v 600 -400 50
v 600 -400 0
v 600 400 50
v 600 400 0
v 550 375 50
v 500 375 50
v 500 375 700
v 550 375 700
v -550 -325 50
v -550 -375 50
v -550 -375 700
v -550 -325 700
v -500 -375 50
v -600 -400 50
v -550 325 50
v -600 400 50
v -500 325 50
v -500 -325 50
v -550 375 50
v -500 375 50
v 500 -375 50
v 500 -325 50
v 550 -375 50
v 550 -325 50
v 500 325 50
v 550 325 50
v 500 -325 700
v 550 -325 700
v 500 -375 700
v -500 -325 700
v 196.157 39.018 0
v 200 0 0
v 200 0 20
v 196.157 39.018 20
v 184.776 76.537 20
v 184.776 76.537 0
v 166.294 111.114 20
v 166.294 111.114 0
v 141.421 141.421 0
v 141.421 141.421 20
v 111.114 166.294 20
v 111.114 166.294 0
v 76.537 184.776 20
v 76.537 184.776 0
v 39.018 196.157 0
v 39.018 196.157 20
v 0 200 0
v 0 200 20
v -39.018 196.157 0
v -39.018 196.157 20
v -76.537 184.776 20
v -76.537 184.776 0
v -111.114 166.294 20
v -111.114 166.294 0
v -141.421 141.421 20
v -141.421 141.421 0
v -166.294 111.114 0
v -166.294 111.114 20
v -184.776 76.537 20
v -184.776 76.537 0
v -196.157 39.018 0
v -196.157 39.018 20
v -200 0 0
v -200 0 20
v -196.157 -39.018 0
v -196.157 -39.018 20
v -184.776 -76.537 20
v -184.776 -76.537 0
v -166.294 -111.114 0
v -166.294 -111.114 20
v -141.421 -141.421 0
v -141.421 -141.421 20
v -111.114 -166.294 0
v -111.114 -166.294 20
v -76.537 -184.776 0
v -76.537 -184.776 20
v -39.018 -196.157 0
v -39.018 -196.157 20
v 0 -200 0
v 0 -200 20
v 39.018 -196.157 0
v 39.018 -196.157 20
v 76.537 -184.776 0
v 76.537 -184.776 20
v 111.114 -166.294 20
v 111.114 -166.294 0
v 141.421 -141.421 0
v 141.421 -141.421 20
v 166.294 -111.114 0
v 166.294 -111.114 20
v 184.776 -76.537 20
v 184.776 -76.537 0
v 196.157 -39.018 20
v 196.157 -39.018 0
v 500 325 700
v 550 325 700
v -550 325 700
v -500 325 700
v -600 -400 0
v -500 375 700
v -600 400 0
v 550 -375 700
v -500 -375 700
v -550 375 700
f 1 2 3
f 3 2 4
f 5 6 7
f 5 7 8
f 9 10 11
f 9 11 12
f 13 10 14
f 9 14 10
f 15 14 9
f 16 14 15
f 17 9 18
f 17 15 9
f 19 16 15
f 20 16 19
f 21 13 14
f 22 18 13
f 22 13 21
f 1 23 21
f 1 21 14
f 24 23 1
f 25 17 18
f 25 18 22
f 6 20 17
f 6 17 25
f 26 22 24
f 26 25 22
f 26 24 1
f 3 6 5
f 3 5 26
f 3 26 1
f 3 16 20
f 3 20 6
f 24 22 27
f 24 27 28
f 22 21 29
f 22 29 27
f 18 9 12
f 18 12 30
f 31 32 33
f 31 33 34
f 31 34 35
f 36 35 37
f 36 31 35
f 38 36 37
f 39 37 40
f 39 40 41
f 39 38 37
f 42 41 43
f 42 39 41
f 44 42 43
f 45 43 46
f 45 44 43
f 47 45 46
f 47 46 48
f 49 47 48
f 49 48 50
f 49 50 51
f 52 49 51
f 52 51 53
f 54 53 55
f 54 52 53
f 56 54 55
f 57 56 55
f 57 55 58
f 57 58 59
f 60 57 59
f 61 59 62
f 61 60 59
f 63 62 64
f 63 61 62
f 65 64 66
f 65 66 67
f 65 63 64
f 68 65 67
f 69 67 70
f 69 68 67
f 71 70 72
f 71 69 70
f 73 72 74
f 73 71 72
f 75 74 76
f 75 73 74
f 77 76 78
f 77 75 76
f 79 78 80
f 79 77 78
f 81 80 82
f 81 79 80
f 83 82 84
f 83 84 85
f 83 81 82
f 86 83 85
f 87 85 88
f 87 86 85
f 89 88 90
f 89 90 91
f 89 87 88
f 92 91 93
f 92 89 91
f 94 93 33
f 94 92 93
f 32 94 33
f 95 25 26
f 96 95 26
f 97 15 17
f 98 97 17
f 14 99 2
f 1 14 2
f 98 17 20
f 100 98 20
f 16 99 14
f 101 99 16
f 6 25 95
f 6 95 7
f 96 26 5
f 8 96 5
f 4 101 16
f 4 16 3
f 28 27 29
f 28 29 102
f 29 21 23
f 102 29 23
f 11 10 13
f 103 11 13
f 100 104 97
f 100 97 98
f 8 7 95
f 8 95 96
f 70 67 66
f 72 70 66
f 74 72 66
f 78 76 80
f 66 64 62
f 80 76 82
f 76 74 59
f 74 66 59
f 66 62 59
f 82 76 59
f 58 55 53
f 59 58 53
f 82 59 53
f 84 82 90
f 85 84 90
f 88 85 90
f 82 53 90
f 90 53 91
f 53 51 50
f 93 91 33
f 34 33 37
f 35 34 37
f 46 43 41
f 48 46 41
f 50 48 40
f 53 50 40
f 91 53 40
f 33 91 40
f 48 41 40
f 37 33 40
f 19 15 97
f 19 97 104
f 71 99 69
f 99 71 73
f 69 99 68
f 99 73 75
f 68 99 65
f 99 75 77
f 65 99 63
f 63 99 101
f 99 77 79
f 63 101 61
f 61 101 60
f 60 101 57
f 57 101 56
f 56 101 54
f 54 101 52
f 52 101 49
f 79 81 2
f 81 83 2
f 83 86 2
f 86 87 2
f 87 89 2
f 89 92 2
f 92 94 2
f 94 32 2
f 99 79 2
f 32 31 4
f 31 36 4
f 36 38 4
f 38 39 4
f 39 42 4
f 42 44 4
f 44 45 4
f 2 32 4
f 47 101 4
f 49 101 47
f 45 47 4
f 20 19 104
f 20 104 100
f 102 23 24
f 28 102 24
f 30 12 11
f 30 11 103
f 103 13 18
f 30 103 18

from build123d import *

# Parameters (mm, degrees)
SKETCH_1_W          = 1200
SKETCH_1_H          = 800
EXTRUDE_1_DEPTH     = 50
SKETCH_2_W          = 50
SKETCH_2_H          = 50
EXTRUDE_2_DEPTH     = 700
SKETCH_3_W          = 50
SKETCH_3_H          = 50
EXTRUDE_3_DEPTH     = 700
SKETCH_4_W          = 50
SKETCH_4_H          = 50
EXTRUDE_4_DEPTH     = 700
SKETCH_5_W          = 50
SKETCH_5_H          = 50
EXTRUDE_5_DEPTH     = 700
SKETCH_6_R          = 200
CUT_EXTRUDE_1_DEPTH = 20


with BuildPart() as part:
    # 草图1 → 凸台-拉伸1 (new body)
    with BuildSketch(Plane.XY):
        Rectangle(SKETCH_1_W, SKETCH_1_H)
    extrude(amount=EXTRUDE_1_DEPTH)

    # 草图2 → 凸台-拉伸2 (add)
    with BuildSketch(Plane.XY):
        with Locations((525, 350)):
            Rectangle(SKETCH_2_W, SKETCH_2_H)
    extrude(amount=EXTRUDE_2_DEPTH)

    # 草图3 → 凸台-拉伸3 (add)
    with BuildSketch(Plane.XY):
        with Locations((525, -350)):
            Rectangle(SKETCH_3_W, SKETCH_3_H)
    extrude(amount=EXTRUDE_3_DEPTH)

    # 草图4 → 凸台-拉伸4 (add)
    with BuildSketch(Plane.XY):
        with Locations((-525, 350)):
            Rectangle(SKETCH_4_W, SKETCH_4_H)
    extrude(amount=EXTRUDE_4_DEPTH)

    # 草图5 → 凸台-拉伸5 (add)
    with BuildSketch(Plane.XY):
        with Locations((-525, -350)):
            Rectangle(SKETCH_5_W, SKETCH_5_H)
    extrude(amount=EXTRUDE_5_DEPTH)

    # 草图6 → 切除-拉伸1 (cut)
    with BuildSketch(Plane.XY):
        Circle(SKETCH_6_R)
    extrude(amount=CUT_EXTRUDE_1_DEPTH, mode=Mode.SUBTRACT)


solid = part.part
